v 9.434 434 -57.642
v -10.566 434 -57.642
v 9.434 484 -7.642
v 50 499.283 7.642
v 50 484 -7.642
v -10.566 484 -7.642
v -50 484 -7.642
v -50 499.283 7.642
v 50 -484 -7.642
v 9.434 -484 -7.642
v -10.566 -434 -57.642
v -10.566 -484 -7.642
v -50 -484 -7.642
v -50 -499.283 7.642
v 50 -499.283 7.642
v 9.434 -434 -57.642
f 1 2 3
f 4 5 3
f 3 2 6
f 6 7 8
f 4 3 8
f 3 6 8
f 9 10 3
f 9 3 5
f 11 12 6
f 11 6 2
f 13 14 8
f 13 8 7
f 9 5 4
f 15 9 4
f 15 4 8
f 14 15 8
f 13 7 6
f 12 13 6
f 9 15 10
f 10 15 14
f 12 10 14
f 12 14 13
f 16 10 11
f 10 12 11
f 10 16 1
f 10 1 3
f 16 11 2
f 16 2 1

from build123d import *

# Parameters (mm, degrees)
F1_DEPTH    = 500
F2_T1_DEPTH = 359.4621544115
F3_T1_DEPTH = 359.4621544115


# Not quite as in the source:
# - a fillet or chamfer that OpenCascade refuses, or shapes differently, is made with other operations: its cross-section is extruded or revolved along the edge and cut away or added


with BuildPart() as f1:
    # F0 (on Front) → F1 (new body, symmetric)
    with BuildSketch(Plane.XZ):
        Polygon((50, -7.6415093219), (50, 7.6415093219), (-50, 7.6415093219), (-50, -7.6415093219), (-10.5660382013, -7.6415093219), (-1.1320764027, -7.6415093219), (0, -7.6415093219), (9.4339617987, -7.6415093219), align=None)
        Polygon((9.4339617987, -57.6415093219), (9.4339617987, -7.6415093219), (0, -7.6415093219), (-1.1320764027, -7.6415093219), (-10.5660382013, -7.6415093219), (-10.5660382013, -57.6415093219), align=None)
    extrude(amount=F1_DEPTH, both=True)

    # F2: chamfer of 66 on 1 edges, made by hand

    # F2_s2 → F2_t1 (cut)
    with BuildSketch(Plane.YZ.offset(-180.2971154071)):
        Polygon((434, -57.6415093219), (500, 8.3584906781), (500, -57.6415093219), align=None)
    extrude(amount=F2_T1_DEPTH, mode=Mode.SUBTRACT)

    # F3: chamfer of 66 on 1 edges, made by hand

    # F3_s2 → F3_t1 (cut)
    with BuildSketch(Plane.YZ.offset(-180.2971154071)):
        Polygon((-500, 8.3584906781), (-434, -57.6415093219), (-500, -57.6415093219), align=None)
    extrude(amount=F3_T1_DEPTH, mode=Mode.SUBTRACT)


solid = f1.part
